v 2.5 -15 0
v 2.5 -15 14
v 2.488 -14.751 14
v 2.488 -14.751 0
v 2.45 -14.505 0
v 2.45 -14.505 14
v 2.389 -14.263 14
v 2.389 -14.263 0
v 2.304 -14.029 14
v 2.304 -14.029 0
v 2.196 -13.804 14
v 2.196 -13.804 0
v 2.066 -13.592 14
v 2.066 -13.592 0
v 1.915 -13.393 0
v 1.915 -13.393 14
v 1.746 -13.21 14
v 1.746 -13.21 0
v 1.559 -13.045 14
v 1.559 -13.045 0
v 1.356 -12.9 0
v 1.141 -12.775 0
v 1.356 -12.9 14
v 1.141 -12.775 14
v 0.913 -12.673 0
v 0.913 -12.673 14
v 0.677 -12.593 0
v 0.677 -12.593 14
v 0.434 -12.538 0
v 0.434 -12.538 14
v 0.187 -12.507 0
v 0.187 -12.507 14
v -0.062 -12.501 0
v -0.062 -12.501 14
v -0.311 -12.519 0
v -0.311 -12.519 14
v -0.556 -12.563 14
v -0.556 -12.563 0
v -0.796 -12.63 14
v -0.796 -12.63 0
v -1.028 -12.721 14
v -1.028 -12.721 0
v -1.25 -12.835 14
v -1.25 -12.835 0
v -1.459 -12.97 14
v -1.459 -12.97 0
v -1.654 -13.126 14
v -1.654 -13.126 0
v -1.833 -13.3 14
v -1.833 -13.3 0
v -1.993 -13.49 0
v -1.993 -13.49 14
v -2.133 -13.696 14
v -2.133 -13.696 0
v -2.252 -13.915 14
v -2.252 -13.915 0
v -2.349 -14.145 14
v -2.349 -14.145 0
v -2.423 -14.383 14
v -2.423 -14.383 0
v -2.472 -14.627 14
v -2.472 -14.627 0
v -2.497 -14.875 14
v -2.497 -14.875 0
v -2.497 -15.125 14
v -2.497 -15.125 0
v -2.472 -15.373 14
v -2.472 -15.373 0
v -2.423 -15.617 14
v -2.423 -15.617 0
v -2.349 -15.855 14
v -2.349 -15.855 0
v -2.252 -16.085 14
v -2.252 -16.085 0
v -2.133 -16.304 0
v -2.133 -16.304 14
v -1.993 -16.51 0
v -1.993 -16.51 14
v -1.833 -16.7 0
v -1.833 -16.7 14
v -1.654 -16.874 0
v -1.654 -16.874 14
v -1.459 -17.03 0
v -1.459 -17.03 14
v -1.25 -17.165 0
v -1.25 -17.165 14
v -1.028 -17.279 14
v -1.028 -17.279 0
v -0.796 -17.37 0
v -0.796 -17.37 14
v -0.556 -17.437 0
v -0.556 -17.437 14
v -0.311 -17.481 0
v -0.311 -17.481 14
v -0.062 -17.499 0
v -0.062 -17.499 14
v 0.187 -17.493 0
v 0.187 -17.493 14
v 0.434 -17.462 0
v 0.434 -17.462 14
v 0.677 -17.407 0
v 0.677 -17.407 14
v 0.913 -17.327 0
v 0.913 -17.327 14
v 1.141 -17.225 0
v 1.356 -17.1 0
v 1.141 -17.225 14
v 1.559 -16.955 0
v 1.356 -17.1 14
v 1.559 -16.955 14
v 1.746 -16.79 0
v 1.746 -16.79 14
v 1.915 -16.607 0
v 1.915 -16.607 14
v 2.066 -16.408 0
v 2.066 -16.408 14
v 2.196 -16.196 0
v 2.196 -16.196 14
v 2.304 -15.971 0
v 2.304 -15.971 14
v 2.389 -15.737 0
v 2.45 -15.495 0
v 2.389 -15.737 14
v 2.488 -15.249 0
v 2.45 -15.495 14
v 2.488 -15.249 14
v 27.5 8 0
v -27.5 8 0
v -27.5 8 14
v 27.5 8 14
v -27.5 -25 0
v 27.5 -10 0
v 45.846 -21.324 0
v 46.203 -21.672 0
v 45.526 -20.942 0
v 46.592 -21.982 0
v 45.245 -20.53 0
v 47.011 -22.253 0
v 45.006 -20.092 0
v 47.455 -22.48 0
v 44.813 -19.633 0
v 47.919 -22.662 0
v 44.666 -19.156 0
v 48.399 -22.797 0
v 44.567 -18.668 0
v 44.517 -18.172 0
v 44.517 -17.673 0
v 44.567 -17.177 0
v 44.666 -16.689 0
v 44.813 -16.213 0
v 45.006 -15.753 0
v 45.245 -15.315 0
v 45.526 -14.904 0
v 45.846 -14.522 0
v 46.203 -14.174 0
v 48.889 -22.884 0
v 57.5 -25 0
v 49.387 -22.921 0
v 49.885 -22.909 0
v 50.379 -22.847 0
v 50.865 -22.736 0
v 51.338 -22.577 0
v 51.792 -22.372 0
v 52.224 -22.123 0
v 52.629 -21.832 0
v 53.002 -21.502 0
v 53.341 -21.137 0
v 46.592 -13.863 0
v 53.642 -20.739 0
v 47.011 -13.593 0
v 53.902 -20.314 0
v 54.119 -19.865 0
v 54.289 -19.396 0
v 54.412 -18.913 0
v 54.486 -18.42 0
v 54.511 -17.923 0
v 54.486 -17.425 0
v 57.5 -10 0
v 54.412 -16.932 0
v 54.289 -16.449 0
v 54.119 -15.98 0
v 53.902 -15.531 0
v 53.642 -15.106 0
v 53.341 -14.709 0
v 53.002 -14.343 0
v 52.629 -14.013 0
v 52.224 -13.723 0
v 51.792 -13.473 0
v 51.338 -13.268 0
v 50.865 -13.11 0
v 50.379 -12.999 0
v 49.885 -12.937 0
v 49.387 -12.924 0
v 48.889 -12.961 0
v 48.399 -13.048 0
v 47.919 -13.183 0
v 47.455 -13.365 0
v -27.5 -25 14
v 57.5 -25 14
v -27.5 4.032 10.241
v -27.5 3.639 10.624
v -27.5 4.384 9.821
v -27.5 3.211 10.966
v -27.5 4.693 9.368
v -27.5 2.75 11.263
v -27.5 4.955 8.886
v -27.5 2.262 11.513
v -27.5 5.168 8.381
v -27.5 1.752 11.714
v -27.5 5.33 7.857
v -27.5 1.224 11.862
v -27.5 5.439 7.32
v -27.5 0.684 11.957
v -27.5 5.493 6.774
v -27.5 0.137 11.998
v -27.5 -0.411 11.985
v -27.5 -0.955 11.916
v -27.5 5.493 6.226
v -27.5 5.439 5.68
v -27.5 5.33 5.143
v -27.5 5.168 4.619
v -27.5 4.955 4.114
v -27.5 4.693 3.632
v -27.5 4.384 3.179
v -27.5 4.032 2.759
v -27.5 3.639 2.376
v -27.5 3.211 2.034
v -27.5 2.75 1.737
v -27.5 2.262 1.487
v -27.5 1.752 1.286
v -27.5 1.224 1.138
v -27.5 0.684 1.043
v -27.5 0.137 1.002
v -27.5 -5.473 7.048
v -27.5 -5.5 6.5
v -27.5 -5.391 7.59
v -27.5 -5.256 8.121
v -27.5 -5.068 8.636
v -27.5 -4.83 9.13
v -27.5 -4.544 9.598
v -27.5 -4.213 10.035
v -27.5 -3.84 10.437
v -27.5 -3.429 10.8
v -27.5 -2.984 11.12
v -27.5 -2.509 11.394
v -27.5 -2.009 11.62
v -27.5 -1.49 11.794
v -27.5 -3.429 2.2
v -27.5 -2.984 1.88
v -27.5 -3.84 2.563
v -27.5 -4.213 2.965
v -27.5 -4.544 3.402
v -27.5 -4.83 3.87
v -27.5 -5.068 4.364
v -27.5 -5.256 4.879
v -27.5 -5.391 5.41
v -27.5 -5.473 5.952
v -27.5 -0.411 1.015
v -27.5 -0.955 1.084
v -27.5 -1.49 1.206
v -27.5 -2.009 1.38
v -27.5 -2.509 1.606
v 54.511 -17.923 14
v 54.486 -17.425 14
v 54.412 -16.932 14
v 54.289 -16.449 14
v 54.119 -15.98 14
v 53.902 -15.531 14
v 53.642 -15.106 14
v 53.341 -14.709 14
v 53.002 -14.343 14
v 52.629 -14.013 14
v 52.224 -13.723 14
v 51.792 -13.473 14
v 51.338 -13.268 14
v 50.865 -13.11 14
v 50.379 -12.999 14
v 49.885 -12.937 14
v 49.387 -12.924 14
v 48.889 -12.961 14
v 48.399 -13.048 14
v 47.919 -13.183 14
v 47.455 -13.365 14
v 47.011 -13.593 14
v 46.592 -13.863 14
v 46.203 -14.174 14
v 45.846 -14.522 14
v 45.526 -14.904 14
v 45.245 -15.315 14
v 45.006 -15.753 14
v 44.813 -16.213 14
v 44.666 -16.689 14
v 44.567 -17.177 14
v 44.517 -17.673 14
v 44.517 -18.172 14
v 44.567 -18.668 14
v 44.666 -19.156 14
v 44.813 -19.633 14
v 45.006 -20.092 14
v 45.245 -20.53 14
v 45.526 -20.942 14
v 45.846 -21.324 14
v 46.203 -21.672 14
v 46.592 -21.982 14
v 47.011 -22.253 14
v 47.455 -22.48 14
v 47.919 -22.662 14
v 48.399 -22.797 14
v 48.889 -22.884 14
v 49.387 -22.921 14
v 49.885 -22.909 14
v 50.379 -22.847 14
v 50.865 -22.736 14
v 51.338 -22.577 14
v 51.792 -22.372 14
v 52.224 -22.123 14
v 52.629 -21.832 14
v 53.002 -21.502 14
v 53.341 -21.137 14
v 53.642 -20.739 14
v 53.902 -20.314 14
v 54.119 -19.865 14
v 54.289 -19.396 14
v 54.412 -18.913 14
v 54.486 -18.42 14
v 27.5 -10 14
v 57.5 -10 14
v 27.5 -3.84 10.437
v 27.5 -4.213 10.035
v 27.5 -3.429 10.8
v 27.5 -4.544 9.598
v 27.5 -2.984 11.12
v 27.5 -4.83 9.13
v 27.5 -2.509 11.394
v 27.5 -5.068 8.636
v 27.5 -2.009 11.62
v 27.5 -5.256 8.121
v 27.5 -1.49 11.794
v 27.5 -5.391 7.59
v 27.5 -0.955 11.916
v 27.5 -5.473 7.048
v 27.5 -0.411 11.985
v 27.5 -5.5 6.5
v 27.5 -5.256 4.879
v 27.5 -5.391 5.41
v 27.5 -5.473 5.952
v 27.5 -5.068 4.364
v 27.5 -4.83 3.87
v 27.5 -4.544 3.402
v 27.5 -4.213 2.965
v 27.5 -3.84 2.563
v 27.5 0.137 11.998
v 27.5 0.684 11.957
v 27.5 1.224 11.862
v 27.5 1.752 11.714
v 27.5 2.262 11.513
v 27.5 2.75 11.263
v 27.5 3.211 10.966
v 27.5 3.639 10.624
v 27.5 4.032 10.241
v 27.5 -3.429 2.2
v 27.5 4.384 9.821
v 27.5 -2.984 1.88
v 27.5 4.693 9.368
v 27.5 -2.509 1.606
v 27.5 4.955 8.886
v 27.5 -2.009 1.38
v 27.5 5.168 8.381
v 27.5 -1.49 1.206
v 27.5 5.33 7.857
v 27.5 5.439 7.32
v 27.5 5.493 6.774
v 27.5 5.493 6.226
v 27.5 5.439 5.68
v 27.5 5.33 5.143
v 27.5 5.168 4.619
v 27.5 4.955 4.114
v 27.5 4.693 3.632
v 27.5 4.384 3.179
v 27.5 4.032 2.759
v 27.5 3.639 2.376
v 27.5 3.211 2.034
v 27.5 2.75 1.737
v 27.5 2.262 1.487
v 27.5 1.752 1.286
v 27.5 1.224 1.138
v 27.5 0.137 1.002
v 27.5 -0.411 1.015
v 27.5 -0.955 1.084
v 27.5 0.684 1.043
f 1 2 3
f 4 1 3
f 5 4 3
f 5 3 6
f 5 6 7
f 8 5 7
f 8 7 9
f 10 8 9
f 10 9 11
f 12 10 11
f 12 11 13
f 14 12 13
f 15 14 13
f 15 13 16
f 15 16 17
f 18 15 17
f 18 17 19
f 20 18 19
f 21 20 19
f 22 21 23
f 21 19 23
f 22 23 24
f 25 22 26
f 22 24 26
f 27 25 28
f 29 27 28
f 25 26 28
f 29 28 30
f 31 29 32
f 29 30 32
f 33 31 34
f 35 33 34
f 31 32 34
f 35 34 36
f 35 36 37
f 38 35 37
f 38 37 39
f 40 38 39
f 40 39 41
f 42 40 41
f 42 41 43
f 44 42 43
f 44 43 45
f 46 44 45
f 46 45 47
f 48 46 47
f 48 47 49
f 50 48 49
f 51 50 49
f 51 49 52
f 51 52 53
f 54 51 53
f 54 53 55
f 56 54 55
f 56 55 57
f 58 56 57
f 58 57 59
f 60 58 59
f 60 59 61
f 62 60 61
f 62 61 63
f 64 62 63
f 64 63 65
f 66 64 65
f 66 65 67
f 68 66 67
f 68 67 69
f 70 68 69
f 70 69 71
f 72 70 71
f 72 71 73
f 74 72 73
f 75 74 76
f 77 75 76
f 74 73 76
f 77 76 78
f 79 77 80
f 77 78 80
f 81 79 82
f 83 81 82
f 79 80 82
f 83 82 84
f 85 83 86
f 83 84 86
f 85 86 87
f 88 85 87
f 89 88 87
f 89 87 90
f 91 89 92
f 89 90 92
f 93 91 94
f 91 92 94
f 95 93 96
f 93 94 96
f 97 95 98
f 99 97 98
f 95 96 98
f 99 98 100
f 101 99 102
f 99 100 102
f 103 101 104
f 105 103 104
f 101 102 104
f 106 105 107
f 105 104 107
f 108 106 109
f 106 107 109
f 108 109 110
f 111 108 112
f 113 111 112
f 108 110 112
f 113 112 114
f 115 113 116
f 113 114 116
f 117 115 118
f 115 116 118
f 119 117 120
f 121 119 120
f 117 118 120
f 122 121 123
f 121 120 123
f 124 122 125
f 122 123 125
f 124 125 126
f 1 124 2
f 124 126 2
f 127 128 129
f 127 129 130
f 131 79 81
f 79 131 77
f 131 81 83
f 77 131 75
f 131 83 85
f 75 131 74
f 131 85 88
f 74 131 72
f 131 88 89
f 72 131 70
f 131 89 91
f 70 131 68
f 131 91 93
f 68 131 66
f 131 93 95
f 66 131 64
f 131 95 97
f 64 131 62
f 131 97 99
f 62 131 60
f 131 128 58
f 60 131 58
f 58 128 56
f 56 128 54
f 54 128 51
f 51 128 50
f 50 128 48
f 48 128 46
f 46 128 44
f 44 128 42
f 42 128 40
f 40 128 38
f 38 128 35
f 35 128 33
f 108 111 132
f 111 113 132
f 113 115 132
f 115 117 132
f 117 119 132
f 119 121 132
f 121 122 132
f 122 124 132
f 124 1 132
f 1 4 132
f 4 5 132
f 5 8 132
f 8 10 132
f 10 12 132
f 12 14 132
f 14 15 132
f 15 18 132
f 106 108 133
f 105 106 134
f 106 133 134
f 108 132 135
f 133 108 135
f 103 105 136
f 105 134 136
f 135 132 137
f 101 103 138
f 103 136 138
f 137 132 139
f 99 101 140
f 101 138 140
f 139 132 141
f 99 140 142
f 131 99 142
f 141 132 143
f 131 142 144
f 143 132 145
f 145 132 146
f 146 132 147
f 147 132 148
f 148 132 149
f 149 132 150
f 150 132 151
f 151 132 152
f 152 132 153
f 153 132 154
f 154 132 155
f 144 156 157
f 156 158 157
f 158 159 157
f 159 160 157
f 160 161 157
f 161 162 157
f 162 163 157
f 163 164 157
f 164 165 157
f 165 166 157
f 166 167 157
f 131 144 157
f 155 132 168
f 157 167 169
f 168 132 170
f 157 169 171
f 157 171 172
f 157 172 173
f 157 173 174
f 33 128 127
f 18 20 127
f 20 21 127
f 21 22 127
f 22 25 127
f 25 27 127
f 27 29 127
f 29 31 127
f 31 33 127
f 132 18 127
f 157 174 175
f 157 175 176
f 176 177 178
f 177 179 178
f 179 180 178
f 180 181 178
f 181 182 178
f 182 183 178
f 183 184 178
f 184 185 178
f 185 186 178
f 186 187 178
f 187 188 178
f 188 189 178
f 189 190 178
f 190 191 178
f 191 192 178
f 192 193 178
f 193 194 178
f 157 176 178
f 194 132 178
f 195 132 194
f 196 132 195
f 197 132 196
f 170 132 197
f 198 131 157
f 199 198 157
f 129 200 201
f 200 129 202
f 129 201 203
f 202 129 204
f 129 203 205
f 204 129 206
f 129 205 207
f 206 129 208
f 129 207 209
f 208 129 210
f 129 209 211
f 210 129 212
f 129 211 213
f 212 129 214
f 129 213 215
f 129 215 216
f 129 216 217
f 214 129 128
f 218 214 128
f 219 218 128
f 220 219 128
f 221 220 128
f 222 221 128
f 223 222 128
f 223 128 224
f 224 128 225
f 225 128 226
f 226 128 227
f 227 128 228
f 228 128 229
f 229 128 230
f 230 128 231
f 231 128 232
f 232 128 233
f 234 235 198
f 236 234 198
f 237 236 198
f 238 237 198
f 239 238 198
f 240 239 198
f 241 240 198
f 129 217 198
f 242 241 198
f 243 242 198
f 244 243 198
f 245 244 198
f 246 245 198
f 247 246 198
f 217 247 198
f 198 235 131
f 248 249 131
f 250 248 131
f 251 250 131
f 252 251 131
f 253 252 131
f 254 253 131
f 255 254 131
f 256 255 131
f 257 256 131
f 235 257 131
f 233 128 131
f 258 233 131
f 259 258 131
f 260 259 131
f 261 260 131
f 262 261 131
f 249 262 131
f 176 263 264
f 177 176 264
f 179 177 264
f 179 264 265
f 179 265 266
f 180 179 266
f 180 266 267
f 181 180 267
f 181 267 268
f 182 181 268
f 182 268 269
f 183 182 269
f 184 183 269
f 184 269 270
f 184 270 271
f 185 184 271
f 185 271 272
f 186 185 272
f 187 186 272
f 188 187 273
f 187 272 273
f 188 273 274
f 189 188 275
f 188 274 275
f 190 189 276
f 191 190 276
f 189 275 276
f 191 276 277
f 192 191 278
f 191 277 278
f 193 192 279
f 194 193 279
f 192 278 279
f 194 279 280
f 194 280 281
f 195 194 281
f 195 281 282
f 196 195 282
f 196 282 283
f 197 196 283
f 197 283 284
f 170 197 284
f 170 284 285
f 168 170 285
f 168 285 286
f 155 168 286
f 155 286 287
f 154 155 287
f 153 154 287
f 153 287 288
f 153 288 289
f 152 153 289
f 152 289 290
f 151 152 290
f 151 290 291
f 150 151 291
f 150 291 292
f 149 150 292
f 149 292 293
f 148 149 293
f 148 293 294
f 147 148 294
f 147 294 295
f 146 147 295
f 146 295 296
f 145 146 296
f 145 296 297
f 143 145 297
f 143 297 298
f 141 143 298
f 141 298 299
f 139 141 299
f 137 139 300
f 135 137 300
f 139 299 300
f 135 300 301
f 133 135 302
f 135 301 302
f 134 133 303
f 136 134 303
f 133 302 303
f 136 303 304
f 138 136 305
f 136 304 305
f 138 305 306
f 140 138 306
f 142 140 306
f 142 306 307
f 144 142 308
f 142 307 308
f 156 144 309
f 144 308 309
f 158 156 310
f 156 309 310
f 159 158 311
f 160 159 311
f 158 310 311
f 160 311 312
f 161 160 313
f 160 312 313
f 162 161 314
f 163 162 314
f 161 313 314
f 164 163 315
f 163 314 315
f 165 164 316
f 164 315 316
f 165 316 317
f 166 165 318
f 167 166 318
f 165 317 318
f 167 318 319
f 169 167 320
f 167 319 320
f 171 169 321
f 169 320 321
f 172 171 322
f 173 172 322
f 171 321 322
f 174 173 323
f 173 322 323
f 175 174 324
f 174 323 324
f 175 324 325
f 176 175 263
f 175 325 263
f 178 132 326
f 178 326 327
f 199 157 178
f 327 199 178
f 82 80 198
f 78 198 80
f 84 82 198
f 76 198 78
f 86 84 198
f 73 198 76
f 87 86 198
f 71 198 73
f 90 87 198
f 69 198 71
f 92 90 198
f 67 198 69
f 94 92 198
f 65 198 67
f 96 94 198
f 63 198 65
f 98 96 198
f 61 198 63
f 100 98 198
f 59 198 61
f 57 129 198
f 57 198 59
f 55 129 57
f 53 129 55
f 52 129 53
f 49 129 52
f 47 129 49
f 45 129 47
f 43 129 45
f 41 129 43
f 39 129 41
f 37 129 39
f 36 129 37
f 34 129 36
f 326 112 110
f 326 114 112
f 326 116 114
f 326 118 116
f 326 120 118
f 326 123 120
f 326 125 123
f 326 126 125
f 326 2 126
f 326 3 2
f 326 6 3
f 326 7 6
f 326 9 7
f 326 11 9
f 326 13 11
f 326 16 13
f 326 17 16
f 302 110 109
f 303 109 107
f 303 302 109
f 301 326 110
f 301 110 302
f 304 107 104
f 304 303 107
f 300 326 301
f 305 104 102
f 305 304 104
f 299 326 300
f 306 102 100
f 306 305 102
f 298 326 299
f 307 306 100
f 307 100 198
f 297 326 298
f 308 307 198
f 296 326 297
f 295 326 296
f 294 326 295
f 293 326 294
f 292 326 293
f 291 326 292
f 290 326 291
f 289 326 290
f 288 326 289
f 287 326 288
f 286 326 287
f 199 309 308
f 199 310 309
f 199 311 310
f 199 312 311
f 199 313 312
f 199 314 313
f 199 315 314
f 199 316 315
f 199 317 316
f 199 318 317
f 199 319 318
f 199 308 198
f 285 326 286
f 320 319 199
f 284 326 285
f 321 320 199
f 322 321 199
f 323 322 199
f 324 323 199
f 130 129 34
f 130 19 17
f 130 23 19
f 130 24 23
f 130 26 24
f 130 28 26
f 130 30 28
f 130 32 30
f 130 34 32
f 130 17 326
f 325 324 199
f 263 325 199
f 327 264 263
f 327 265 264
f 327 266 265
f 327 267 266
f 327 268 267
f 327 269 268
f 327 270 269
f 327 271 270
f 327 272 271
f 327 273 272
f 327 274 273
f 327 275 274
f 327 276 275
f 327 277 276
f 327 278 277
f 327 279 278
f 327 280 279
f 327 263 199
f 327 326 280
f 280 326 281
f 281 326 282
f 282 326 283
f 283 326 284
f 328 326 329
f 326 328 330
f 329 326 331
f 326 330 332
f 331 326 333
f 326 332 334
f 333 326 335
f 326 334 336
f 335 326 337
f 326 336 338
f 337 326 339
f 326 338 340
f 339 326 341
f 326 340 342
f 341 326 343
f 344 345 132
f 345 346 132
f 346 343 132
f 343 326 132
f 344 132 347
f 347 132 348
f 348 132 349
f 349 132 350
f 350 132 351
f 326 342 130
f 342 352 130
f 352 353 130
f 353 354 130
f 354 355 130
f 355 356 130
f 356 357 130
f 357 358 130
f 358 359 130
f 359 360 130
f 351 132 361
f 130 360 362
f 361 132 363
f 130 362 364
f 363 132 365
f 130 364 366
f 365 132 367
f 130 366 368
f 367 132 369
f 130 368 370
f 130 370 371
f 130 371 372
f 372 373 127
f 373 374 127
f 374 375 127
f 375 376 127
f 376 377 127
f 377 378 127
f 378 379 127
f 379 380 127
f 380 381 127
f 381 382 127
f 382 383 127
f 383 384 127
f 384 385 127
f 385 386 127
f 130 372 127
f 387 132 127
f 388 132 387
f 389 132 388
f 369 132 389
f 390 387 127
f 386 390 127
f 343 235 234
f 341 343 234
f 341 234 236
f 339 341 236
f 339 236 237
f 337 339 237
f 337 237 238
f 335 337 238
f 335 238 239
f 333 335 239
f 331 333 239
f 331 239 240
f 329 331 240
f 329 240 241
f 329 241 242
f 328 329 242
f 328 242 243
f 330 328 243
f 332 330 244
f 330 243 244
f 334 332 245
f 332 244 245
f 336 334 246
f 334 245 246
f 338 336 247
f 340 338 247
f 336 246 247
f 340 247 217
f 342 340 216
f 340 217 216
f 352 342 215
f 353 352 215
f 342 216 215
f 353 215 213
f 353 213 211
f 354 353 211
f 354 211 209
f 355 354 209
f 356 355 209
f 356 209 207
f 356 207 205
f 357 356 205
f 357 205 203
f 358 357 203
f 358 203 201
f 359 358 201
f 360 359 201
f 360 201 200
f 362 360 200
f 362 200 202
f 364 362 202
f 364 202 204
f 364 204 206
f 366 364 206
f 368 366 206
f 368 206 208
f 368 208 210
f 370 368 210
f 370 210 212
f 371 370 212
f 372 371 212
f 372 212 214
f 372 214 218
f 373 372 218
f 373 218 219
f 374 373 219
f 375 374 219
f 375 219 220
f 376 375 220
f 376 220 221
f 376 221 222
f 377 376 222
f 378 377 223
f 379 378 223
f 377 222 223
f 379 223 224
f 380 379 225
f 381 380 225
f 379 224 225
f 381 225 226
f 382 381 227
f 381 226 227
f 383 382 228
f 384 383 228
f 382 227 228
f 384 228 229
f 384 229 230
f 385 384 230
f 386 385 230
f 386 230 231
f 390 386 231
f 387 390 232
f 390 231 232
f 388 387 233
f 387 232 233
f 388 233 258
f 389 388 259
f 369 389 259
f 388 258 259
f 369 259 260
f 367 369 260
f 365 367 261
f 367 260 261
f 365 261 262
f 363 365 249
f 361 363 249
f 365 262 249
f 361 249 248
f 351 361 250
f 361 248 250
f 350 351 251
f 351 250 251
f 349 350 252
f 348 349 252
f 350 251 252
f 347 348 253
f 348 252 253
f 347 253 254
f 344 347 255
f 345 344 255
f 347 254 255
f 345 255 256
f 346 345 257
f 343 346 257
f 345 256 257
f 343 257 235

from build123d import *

# Parameters (mm, degrees)
F0_W     = 30
F0_H     = 15
F1_DEPTH = 14
F3_R     = 2.5
F4_DEPTH = 14.001
F5_R     = 5
F6_DEPTH = 14.001
F7_W     = 55
F7_H     = 17
F8_DEPTH = 14.001
F2_R     = 5.5
F9_DEPTH = 85.001


with BuildPart() as f1:
    # F0 (on Top) → F1 (new body)
    with BuildSketch(Plane.XY):
        Polygon((27.5, 25), (-27.5, 25), (-27.5, -25), (27.5, -25), (27.5, -10), align=None)
        with Locations((42.5, -17.5)):
            Rectangle(F0_W, F0_H)
    extrude(amount=F1_DEPTH)

    # F3 (on face) → F4 (cut, through all)
    with BuildSketch(Plane.XY.offset(14)):
        with Locations((0, -15)):
            Circle(F3_R)
    extrude(amount=-F4_DEPTH, mode=Mode.SUBTRACT)

    # F5 (on face) → F6 (cut, through all)
    with BuildSketch(Plane.XY.offset(14)):
        with Locations((49.511172, -17.922652)):
            Circle(F5_R)
    extrude(amount=-F6_DEPTH, mode=Mode.SUBTRACT)

    # F7 (on face) → F8 (cut, through all)
    with BuildSketch(Plane(origin=(0, 0, 0), x_dir=(1, 0, 0), z_dir=(0, 0, -1))):
        with Locations((0, -16.5)):
            Rectangle(F7_W, F7_H)
    extrude(amount=-F8_DEPTH, mode=Mode.SUBTRACT)

    # F2 (on face) → F9 (cut, through all)
    with BuildSketch(Plane(origin=(-27.5, 0, 0), x_dir=(0, -1, 0), z_dir=(-1, 0, 0))):
        with Locations((0, 6.5)):
            Circle(F2_R)
    extrude(amount=-F9_DEPTH, mode=Mode.SUBTRACT)


solid = f1.part
